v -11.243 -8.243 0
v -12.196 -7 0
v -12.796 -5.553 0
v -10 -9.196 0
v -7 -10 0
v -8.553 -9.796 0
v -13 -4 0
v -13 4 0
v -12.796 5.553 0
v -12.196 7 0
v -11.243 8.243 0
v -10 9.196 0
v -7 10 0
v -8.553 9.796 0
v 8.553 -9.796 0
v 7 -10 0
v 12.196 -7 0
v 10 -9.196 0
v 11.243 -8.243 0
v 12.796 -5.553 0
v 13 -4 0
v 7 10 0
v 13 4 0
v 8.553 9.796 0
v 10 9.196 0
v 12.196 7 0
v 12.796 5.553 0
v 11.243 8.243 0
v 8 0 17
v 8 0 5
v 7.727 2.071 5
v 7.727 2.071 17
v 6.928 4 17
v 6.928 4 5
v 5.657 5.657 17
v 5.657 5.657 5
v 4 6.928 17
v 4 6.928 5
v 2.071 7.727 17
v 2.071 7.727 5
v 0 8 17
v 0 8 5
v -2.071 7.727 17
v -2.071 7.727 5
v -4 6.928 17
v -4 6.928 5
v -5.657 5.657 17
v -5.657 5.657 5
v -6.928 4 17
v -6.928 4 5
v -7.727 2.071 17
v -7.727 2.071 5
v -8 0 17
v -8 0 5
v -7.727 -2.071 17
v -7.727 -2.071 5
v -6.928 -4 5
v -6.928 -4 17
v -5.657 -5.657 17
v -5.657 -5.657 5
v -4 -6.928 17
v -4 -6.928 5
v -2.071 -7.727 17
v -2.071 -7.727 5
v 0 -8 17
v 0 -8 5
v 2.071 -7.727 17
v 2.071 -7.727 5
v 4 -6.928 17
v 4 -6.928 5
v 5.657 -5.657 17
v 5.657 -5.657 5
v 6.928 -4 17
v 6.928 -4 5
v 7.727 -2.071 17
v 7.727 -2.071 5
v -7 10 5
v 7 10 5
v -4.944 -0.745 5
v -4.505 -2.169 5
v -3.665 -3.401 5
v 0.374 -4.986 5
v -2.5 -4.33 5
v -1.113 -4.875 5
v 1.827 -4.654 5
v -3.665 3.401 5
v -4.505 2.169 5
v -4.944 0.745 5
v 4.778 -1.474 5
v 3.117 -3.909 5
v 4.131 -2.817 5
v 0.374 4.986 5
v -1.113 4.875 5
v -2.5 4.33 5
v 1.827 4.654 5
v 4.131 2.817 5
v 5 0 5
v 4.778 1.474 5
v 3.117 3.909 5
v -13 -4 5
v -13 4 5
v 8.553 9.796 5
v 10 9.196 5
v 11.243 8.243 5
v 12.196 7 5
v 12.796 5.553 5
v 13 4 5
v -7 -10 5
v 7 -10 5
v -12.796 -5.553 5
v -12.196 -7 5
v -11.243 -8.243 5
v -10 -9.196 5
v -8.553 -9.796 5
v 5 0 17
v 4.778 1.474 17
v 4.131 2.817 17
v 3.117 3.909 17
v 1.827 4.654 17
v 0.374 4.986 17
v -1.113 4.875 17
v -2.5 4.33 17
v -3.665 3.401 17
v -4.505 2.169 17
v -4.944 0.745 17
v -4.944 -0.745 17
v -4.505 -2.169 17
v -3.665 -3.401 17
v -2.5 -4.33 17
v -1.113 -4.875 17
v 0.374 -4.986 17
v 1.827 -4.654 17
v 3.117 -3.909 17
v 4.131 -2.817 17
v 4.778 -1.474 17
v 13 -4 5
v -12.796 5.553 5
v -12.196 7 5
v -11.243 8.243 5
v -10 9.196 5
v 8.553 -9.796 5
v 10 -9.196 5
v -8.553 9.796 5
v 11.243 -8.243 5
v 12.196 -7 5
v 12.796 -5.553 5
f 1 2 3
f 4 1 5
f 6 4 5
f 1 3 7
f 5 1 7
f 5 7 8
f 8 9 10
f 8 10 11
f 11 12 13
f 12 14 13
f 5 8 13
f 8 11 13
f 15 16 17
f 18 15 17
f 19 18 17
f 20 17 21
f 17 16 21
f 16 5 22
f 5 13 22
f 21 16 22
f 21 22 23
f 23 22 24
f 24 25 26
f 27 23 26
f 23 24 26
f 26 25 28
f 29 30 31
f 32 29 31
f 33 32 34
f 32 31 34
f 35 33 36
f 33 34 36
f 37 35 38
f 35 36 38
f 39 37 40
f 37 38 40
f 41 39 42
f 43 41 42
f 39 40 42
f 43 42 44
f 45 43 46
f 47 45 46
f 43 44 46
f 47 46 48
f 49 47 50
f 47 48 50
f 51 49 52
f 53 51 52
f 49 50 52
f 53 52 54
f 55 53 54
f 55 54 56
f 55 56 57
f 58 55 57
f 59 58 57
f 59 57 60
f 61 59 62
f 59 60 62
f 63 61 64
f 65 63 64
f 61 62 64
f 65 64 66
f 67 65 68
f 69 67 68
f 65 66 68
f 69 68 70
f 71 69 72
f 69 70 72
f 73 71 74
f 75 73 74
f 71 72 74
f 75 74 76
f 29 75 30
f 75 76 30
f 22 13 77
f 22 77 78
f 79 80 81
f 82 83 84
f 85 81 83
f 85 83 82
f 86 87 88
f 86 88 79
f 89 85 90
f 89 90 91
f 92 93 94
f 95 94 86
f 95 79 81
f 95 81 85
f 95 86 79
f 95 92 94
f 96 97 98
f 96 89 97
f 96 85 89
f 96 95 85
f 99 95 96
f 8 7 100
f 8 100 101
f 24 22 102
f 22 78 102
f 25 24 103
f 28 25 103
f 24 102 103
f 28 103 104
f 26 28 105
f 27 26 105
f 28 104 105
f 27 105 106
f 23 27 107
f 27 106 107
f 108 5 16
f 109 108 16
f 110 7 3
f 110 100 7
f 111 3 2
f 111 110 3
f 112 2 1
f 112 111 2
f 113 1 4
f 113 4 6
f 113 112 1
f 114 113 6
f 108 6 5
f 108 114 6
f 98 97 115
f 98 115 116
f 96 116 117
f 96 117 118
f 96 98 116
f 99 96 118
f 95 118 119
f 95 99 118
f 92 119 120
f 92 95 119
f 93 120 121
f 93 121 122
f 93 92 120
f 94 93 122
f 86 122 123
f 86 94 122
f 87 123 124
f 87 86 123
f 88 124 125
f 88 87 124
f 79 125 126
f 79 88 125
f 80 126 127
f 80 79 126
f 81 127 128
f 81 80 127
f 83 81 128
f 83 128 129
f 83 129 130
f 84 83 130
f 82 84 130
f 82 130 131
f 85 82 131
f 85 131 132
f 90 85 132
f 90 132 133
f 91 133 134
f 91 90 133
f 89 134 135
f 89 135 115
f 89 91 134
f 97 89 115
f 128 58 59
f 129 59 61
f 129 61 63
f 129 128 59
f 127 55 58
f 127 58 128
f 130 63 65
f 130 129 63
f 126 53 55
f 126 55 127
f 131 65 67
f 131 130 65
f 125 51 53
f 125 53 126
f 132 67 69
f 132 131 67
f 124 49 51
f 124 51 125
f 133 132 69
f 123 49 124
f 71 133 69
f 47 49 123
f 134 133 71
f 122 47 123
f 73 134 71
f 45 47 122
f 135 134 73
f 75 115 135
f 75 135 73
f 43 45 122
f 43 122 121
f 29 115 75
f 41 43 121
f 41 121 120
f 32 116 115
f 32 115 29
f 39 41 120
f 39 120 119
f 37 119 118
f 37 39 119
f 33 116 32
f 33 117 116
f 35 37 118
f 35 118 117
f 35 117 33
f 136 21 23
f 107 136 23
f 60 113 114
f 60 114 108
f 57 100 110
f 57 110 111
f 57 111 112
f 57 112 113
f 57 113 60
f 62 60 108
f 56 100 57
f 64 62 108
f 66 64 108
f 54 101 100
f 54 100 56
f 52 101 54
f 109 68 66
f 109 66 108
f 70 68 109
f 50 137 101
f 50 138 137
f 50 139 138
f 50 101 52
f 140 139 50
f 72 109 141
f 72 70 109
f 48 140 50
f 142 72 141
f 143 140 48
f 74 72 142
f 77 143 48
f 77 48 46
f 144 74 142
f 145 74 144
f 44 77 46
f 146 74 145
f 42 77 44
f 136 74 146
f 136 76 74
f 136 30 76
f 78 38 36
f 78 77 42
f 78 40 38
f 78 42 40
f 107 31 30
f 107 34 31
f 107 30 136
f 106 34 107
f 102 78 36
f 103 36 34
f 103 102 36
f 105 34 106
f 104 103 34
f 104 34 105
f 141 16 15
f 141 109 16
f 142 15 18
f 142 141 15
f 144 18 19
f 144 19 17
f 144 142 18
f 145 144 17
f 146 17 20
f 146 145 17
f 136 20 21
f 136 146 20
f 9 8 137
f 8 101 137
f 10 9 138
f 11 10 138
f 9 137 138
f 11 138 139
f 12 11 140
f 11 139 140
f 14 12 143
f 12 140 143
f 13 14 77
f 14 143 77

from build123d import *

# Parameters (mm, degrees)
SKETCH_1_W      = 26
SKETCH_1_H      = 20
EXTRUDE_1_DEPTH = 5
SKETCH_2_R      = 8
SKETCH_2_R_2    = 5
EXTRUDE_2_DEPTH = 12
FILLET_1_R      = 6


with BuildPart() as part:
    # 草图1 → 凸台-拉伸1 (new body)
    with BuildSketch(Plane.XY):
        Rectangle(SKETCH_1_W, SKETCH_1_H)
    extrude(amount=EXTRUDE_1_DEPTH)

    # 草图2 → 凸台-拉伸2 (add)
    with BuildSketch(Plane.XY.offset(5)):
        Circle(SKETCH_2_R)
        Circle(SKETCH_2_R_2, mode=Mode.SUBTRACT)
    extrude(amount=EXTRUDE_2_DEPTH)

    # 圆角1
    fillet_1_edges = [part.edges().sort_by_distance(p)[0] for p in [
        (13, 10, 2.5),
        (13, -10, 2.5),
        (-13, -10, 2.5),
        (-13, 10, 2.5),
    ]]
    fillet(fillet_1_edges, radius=FILLET_1_R)


solid = part.part
